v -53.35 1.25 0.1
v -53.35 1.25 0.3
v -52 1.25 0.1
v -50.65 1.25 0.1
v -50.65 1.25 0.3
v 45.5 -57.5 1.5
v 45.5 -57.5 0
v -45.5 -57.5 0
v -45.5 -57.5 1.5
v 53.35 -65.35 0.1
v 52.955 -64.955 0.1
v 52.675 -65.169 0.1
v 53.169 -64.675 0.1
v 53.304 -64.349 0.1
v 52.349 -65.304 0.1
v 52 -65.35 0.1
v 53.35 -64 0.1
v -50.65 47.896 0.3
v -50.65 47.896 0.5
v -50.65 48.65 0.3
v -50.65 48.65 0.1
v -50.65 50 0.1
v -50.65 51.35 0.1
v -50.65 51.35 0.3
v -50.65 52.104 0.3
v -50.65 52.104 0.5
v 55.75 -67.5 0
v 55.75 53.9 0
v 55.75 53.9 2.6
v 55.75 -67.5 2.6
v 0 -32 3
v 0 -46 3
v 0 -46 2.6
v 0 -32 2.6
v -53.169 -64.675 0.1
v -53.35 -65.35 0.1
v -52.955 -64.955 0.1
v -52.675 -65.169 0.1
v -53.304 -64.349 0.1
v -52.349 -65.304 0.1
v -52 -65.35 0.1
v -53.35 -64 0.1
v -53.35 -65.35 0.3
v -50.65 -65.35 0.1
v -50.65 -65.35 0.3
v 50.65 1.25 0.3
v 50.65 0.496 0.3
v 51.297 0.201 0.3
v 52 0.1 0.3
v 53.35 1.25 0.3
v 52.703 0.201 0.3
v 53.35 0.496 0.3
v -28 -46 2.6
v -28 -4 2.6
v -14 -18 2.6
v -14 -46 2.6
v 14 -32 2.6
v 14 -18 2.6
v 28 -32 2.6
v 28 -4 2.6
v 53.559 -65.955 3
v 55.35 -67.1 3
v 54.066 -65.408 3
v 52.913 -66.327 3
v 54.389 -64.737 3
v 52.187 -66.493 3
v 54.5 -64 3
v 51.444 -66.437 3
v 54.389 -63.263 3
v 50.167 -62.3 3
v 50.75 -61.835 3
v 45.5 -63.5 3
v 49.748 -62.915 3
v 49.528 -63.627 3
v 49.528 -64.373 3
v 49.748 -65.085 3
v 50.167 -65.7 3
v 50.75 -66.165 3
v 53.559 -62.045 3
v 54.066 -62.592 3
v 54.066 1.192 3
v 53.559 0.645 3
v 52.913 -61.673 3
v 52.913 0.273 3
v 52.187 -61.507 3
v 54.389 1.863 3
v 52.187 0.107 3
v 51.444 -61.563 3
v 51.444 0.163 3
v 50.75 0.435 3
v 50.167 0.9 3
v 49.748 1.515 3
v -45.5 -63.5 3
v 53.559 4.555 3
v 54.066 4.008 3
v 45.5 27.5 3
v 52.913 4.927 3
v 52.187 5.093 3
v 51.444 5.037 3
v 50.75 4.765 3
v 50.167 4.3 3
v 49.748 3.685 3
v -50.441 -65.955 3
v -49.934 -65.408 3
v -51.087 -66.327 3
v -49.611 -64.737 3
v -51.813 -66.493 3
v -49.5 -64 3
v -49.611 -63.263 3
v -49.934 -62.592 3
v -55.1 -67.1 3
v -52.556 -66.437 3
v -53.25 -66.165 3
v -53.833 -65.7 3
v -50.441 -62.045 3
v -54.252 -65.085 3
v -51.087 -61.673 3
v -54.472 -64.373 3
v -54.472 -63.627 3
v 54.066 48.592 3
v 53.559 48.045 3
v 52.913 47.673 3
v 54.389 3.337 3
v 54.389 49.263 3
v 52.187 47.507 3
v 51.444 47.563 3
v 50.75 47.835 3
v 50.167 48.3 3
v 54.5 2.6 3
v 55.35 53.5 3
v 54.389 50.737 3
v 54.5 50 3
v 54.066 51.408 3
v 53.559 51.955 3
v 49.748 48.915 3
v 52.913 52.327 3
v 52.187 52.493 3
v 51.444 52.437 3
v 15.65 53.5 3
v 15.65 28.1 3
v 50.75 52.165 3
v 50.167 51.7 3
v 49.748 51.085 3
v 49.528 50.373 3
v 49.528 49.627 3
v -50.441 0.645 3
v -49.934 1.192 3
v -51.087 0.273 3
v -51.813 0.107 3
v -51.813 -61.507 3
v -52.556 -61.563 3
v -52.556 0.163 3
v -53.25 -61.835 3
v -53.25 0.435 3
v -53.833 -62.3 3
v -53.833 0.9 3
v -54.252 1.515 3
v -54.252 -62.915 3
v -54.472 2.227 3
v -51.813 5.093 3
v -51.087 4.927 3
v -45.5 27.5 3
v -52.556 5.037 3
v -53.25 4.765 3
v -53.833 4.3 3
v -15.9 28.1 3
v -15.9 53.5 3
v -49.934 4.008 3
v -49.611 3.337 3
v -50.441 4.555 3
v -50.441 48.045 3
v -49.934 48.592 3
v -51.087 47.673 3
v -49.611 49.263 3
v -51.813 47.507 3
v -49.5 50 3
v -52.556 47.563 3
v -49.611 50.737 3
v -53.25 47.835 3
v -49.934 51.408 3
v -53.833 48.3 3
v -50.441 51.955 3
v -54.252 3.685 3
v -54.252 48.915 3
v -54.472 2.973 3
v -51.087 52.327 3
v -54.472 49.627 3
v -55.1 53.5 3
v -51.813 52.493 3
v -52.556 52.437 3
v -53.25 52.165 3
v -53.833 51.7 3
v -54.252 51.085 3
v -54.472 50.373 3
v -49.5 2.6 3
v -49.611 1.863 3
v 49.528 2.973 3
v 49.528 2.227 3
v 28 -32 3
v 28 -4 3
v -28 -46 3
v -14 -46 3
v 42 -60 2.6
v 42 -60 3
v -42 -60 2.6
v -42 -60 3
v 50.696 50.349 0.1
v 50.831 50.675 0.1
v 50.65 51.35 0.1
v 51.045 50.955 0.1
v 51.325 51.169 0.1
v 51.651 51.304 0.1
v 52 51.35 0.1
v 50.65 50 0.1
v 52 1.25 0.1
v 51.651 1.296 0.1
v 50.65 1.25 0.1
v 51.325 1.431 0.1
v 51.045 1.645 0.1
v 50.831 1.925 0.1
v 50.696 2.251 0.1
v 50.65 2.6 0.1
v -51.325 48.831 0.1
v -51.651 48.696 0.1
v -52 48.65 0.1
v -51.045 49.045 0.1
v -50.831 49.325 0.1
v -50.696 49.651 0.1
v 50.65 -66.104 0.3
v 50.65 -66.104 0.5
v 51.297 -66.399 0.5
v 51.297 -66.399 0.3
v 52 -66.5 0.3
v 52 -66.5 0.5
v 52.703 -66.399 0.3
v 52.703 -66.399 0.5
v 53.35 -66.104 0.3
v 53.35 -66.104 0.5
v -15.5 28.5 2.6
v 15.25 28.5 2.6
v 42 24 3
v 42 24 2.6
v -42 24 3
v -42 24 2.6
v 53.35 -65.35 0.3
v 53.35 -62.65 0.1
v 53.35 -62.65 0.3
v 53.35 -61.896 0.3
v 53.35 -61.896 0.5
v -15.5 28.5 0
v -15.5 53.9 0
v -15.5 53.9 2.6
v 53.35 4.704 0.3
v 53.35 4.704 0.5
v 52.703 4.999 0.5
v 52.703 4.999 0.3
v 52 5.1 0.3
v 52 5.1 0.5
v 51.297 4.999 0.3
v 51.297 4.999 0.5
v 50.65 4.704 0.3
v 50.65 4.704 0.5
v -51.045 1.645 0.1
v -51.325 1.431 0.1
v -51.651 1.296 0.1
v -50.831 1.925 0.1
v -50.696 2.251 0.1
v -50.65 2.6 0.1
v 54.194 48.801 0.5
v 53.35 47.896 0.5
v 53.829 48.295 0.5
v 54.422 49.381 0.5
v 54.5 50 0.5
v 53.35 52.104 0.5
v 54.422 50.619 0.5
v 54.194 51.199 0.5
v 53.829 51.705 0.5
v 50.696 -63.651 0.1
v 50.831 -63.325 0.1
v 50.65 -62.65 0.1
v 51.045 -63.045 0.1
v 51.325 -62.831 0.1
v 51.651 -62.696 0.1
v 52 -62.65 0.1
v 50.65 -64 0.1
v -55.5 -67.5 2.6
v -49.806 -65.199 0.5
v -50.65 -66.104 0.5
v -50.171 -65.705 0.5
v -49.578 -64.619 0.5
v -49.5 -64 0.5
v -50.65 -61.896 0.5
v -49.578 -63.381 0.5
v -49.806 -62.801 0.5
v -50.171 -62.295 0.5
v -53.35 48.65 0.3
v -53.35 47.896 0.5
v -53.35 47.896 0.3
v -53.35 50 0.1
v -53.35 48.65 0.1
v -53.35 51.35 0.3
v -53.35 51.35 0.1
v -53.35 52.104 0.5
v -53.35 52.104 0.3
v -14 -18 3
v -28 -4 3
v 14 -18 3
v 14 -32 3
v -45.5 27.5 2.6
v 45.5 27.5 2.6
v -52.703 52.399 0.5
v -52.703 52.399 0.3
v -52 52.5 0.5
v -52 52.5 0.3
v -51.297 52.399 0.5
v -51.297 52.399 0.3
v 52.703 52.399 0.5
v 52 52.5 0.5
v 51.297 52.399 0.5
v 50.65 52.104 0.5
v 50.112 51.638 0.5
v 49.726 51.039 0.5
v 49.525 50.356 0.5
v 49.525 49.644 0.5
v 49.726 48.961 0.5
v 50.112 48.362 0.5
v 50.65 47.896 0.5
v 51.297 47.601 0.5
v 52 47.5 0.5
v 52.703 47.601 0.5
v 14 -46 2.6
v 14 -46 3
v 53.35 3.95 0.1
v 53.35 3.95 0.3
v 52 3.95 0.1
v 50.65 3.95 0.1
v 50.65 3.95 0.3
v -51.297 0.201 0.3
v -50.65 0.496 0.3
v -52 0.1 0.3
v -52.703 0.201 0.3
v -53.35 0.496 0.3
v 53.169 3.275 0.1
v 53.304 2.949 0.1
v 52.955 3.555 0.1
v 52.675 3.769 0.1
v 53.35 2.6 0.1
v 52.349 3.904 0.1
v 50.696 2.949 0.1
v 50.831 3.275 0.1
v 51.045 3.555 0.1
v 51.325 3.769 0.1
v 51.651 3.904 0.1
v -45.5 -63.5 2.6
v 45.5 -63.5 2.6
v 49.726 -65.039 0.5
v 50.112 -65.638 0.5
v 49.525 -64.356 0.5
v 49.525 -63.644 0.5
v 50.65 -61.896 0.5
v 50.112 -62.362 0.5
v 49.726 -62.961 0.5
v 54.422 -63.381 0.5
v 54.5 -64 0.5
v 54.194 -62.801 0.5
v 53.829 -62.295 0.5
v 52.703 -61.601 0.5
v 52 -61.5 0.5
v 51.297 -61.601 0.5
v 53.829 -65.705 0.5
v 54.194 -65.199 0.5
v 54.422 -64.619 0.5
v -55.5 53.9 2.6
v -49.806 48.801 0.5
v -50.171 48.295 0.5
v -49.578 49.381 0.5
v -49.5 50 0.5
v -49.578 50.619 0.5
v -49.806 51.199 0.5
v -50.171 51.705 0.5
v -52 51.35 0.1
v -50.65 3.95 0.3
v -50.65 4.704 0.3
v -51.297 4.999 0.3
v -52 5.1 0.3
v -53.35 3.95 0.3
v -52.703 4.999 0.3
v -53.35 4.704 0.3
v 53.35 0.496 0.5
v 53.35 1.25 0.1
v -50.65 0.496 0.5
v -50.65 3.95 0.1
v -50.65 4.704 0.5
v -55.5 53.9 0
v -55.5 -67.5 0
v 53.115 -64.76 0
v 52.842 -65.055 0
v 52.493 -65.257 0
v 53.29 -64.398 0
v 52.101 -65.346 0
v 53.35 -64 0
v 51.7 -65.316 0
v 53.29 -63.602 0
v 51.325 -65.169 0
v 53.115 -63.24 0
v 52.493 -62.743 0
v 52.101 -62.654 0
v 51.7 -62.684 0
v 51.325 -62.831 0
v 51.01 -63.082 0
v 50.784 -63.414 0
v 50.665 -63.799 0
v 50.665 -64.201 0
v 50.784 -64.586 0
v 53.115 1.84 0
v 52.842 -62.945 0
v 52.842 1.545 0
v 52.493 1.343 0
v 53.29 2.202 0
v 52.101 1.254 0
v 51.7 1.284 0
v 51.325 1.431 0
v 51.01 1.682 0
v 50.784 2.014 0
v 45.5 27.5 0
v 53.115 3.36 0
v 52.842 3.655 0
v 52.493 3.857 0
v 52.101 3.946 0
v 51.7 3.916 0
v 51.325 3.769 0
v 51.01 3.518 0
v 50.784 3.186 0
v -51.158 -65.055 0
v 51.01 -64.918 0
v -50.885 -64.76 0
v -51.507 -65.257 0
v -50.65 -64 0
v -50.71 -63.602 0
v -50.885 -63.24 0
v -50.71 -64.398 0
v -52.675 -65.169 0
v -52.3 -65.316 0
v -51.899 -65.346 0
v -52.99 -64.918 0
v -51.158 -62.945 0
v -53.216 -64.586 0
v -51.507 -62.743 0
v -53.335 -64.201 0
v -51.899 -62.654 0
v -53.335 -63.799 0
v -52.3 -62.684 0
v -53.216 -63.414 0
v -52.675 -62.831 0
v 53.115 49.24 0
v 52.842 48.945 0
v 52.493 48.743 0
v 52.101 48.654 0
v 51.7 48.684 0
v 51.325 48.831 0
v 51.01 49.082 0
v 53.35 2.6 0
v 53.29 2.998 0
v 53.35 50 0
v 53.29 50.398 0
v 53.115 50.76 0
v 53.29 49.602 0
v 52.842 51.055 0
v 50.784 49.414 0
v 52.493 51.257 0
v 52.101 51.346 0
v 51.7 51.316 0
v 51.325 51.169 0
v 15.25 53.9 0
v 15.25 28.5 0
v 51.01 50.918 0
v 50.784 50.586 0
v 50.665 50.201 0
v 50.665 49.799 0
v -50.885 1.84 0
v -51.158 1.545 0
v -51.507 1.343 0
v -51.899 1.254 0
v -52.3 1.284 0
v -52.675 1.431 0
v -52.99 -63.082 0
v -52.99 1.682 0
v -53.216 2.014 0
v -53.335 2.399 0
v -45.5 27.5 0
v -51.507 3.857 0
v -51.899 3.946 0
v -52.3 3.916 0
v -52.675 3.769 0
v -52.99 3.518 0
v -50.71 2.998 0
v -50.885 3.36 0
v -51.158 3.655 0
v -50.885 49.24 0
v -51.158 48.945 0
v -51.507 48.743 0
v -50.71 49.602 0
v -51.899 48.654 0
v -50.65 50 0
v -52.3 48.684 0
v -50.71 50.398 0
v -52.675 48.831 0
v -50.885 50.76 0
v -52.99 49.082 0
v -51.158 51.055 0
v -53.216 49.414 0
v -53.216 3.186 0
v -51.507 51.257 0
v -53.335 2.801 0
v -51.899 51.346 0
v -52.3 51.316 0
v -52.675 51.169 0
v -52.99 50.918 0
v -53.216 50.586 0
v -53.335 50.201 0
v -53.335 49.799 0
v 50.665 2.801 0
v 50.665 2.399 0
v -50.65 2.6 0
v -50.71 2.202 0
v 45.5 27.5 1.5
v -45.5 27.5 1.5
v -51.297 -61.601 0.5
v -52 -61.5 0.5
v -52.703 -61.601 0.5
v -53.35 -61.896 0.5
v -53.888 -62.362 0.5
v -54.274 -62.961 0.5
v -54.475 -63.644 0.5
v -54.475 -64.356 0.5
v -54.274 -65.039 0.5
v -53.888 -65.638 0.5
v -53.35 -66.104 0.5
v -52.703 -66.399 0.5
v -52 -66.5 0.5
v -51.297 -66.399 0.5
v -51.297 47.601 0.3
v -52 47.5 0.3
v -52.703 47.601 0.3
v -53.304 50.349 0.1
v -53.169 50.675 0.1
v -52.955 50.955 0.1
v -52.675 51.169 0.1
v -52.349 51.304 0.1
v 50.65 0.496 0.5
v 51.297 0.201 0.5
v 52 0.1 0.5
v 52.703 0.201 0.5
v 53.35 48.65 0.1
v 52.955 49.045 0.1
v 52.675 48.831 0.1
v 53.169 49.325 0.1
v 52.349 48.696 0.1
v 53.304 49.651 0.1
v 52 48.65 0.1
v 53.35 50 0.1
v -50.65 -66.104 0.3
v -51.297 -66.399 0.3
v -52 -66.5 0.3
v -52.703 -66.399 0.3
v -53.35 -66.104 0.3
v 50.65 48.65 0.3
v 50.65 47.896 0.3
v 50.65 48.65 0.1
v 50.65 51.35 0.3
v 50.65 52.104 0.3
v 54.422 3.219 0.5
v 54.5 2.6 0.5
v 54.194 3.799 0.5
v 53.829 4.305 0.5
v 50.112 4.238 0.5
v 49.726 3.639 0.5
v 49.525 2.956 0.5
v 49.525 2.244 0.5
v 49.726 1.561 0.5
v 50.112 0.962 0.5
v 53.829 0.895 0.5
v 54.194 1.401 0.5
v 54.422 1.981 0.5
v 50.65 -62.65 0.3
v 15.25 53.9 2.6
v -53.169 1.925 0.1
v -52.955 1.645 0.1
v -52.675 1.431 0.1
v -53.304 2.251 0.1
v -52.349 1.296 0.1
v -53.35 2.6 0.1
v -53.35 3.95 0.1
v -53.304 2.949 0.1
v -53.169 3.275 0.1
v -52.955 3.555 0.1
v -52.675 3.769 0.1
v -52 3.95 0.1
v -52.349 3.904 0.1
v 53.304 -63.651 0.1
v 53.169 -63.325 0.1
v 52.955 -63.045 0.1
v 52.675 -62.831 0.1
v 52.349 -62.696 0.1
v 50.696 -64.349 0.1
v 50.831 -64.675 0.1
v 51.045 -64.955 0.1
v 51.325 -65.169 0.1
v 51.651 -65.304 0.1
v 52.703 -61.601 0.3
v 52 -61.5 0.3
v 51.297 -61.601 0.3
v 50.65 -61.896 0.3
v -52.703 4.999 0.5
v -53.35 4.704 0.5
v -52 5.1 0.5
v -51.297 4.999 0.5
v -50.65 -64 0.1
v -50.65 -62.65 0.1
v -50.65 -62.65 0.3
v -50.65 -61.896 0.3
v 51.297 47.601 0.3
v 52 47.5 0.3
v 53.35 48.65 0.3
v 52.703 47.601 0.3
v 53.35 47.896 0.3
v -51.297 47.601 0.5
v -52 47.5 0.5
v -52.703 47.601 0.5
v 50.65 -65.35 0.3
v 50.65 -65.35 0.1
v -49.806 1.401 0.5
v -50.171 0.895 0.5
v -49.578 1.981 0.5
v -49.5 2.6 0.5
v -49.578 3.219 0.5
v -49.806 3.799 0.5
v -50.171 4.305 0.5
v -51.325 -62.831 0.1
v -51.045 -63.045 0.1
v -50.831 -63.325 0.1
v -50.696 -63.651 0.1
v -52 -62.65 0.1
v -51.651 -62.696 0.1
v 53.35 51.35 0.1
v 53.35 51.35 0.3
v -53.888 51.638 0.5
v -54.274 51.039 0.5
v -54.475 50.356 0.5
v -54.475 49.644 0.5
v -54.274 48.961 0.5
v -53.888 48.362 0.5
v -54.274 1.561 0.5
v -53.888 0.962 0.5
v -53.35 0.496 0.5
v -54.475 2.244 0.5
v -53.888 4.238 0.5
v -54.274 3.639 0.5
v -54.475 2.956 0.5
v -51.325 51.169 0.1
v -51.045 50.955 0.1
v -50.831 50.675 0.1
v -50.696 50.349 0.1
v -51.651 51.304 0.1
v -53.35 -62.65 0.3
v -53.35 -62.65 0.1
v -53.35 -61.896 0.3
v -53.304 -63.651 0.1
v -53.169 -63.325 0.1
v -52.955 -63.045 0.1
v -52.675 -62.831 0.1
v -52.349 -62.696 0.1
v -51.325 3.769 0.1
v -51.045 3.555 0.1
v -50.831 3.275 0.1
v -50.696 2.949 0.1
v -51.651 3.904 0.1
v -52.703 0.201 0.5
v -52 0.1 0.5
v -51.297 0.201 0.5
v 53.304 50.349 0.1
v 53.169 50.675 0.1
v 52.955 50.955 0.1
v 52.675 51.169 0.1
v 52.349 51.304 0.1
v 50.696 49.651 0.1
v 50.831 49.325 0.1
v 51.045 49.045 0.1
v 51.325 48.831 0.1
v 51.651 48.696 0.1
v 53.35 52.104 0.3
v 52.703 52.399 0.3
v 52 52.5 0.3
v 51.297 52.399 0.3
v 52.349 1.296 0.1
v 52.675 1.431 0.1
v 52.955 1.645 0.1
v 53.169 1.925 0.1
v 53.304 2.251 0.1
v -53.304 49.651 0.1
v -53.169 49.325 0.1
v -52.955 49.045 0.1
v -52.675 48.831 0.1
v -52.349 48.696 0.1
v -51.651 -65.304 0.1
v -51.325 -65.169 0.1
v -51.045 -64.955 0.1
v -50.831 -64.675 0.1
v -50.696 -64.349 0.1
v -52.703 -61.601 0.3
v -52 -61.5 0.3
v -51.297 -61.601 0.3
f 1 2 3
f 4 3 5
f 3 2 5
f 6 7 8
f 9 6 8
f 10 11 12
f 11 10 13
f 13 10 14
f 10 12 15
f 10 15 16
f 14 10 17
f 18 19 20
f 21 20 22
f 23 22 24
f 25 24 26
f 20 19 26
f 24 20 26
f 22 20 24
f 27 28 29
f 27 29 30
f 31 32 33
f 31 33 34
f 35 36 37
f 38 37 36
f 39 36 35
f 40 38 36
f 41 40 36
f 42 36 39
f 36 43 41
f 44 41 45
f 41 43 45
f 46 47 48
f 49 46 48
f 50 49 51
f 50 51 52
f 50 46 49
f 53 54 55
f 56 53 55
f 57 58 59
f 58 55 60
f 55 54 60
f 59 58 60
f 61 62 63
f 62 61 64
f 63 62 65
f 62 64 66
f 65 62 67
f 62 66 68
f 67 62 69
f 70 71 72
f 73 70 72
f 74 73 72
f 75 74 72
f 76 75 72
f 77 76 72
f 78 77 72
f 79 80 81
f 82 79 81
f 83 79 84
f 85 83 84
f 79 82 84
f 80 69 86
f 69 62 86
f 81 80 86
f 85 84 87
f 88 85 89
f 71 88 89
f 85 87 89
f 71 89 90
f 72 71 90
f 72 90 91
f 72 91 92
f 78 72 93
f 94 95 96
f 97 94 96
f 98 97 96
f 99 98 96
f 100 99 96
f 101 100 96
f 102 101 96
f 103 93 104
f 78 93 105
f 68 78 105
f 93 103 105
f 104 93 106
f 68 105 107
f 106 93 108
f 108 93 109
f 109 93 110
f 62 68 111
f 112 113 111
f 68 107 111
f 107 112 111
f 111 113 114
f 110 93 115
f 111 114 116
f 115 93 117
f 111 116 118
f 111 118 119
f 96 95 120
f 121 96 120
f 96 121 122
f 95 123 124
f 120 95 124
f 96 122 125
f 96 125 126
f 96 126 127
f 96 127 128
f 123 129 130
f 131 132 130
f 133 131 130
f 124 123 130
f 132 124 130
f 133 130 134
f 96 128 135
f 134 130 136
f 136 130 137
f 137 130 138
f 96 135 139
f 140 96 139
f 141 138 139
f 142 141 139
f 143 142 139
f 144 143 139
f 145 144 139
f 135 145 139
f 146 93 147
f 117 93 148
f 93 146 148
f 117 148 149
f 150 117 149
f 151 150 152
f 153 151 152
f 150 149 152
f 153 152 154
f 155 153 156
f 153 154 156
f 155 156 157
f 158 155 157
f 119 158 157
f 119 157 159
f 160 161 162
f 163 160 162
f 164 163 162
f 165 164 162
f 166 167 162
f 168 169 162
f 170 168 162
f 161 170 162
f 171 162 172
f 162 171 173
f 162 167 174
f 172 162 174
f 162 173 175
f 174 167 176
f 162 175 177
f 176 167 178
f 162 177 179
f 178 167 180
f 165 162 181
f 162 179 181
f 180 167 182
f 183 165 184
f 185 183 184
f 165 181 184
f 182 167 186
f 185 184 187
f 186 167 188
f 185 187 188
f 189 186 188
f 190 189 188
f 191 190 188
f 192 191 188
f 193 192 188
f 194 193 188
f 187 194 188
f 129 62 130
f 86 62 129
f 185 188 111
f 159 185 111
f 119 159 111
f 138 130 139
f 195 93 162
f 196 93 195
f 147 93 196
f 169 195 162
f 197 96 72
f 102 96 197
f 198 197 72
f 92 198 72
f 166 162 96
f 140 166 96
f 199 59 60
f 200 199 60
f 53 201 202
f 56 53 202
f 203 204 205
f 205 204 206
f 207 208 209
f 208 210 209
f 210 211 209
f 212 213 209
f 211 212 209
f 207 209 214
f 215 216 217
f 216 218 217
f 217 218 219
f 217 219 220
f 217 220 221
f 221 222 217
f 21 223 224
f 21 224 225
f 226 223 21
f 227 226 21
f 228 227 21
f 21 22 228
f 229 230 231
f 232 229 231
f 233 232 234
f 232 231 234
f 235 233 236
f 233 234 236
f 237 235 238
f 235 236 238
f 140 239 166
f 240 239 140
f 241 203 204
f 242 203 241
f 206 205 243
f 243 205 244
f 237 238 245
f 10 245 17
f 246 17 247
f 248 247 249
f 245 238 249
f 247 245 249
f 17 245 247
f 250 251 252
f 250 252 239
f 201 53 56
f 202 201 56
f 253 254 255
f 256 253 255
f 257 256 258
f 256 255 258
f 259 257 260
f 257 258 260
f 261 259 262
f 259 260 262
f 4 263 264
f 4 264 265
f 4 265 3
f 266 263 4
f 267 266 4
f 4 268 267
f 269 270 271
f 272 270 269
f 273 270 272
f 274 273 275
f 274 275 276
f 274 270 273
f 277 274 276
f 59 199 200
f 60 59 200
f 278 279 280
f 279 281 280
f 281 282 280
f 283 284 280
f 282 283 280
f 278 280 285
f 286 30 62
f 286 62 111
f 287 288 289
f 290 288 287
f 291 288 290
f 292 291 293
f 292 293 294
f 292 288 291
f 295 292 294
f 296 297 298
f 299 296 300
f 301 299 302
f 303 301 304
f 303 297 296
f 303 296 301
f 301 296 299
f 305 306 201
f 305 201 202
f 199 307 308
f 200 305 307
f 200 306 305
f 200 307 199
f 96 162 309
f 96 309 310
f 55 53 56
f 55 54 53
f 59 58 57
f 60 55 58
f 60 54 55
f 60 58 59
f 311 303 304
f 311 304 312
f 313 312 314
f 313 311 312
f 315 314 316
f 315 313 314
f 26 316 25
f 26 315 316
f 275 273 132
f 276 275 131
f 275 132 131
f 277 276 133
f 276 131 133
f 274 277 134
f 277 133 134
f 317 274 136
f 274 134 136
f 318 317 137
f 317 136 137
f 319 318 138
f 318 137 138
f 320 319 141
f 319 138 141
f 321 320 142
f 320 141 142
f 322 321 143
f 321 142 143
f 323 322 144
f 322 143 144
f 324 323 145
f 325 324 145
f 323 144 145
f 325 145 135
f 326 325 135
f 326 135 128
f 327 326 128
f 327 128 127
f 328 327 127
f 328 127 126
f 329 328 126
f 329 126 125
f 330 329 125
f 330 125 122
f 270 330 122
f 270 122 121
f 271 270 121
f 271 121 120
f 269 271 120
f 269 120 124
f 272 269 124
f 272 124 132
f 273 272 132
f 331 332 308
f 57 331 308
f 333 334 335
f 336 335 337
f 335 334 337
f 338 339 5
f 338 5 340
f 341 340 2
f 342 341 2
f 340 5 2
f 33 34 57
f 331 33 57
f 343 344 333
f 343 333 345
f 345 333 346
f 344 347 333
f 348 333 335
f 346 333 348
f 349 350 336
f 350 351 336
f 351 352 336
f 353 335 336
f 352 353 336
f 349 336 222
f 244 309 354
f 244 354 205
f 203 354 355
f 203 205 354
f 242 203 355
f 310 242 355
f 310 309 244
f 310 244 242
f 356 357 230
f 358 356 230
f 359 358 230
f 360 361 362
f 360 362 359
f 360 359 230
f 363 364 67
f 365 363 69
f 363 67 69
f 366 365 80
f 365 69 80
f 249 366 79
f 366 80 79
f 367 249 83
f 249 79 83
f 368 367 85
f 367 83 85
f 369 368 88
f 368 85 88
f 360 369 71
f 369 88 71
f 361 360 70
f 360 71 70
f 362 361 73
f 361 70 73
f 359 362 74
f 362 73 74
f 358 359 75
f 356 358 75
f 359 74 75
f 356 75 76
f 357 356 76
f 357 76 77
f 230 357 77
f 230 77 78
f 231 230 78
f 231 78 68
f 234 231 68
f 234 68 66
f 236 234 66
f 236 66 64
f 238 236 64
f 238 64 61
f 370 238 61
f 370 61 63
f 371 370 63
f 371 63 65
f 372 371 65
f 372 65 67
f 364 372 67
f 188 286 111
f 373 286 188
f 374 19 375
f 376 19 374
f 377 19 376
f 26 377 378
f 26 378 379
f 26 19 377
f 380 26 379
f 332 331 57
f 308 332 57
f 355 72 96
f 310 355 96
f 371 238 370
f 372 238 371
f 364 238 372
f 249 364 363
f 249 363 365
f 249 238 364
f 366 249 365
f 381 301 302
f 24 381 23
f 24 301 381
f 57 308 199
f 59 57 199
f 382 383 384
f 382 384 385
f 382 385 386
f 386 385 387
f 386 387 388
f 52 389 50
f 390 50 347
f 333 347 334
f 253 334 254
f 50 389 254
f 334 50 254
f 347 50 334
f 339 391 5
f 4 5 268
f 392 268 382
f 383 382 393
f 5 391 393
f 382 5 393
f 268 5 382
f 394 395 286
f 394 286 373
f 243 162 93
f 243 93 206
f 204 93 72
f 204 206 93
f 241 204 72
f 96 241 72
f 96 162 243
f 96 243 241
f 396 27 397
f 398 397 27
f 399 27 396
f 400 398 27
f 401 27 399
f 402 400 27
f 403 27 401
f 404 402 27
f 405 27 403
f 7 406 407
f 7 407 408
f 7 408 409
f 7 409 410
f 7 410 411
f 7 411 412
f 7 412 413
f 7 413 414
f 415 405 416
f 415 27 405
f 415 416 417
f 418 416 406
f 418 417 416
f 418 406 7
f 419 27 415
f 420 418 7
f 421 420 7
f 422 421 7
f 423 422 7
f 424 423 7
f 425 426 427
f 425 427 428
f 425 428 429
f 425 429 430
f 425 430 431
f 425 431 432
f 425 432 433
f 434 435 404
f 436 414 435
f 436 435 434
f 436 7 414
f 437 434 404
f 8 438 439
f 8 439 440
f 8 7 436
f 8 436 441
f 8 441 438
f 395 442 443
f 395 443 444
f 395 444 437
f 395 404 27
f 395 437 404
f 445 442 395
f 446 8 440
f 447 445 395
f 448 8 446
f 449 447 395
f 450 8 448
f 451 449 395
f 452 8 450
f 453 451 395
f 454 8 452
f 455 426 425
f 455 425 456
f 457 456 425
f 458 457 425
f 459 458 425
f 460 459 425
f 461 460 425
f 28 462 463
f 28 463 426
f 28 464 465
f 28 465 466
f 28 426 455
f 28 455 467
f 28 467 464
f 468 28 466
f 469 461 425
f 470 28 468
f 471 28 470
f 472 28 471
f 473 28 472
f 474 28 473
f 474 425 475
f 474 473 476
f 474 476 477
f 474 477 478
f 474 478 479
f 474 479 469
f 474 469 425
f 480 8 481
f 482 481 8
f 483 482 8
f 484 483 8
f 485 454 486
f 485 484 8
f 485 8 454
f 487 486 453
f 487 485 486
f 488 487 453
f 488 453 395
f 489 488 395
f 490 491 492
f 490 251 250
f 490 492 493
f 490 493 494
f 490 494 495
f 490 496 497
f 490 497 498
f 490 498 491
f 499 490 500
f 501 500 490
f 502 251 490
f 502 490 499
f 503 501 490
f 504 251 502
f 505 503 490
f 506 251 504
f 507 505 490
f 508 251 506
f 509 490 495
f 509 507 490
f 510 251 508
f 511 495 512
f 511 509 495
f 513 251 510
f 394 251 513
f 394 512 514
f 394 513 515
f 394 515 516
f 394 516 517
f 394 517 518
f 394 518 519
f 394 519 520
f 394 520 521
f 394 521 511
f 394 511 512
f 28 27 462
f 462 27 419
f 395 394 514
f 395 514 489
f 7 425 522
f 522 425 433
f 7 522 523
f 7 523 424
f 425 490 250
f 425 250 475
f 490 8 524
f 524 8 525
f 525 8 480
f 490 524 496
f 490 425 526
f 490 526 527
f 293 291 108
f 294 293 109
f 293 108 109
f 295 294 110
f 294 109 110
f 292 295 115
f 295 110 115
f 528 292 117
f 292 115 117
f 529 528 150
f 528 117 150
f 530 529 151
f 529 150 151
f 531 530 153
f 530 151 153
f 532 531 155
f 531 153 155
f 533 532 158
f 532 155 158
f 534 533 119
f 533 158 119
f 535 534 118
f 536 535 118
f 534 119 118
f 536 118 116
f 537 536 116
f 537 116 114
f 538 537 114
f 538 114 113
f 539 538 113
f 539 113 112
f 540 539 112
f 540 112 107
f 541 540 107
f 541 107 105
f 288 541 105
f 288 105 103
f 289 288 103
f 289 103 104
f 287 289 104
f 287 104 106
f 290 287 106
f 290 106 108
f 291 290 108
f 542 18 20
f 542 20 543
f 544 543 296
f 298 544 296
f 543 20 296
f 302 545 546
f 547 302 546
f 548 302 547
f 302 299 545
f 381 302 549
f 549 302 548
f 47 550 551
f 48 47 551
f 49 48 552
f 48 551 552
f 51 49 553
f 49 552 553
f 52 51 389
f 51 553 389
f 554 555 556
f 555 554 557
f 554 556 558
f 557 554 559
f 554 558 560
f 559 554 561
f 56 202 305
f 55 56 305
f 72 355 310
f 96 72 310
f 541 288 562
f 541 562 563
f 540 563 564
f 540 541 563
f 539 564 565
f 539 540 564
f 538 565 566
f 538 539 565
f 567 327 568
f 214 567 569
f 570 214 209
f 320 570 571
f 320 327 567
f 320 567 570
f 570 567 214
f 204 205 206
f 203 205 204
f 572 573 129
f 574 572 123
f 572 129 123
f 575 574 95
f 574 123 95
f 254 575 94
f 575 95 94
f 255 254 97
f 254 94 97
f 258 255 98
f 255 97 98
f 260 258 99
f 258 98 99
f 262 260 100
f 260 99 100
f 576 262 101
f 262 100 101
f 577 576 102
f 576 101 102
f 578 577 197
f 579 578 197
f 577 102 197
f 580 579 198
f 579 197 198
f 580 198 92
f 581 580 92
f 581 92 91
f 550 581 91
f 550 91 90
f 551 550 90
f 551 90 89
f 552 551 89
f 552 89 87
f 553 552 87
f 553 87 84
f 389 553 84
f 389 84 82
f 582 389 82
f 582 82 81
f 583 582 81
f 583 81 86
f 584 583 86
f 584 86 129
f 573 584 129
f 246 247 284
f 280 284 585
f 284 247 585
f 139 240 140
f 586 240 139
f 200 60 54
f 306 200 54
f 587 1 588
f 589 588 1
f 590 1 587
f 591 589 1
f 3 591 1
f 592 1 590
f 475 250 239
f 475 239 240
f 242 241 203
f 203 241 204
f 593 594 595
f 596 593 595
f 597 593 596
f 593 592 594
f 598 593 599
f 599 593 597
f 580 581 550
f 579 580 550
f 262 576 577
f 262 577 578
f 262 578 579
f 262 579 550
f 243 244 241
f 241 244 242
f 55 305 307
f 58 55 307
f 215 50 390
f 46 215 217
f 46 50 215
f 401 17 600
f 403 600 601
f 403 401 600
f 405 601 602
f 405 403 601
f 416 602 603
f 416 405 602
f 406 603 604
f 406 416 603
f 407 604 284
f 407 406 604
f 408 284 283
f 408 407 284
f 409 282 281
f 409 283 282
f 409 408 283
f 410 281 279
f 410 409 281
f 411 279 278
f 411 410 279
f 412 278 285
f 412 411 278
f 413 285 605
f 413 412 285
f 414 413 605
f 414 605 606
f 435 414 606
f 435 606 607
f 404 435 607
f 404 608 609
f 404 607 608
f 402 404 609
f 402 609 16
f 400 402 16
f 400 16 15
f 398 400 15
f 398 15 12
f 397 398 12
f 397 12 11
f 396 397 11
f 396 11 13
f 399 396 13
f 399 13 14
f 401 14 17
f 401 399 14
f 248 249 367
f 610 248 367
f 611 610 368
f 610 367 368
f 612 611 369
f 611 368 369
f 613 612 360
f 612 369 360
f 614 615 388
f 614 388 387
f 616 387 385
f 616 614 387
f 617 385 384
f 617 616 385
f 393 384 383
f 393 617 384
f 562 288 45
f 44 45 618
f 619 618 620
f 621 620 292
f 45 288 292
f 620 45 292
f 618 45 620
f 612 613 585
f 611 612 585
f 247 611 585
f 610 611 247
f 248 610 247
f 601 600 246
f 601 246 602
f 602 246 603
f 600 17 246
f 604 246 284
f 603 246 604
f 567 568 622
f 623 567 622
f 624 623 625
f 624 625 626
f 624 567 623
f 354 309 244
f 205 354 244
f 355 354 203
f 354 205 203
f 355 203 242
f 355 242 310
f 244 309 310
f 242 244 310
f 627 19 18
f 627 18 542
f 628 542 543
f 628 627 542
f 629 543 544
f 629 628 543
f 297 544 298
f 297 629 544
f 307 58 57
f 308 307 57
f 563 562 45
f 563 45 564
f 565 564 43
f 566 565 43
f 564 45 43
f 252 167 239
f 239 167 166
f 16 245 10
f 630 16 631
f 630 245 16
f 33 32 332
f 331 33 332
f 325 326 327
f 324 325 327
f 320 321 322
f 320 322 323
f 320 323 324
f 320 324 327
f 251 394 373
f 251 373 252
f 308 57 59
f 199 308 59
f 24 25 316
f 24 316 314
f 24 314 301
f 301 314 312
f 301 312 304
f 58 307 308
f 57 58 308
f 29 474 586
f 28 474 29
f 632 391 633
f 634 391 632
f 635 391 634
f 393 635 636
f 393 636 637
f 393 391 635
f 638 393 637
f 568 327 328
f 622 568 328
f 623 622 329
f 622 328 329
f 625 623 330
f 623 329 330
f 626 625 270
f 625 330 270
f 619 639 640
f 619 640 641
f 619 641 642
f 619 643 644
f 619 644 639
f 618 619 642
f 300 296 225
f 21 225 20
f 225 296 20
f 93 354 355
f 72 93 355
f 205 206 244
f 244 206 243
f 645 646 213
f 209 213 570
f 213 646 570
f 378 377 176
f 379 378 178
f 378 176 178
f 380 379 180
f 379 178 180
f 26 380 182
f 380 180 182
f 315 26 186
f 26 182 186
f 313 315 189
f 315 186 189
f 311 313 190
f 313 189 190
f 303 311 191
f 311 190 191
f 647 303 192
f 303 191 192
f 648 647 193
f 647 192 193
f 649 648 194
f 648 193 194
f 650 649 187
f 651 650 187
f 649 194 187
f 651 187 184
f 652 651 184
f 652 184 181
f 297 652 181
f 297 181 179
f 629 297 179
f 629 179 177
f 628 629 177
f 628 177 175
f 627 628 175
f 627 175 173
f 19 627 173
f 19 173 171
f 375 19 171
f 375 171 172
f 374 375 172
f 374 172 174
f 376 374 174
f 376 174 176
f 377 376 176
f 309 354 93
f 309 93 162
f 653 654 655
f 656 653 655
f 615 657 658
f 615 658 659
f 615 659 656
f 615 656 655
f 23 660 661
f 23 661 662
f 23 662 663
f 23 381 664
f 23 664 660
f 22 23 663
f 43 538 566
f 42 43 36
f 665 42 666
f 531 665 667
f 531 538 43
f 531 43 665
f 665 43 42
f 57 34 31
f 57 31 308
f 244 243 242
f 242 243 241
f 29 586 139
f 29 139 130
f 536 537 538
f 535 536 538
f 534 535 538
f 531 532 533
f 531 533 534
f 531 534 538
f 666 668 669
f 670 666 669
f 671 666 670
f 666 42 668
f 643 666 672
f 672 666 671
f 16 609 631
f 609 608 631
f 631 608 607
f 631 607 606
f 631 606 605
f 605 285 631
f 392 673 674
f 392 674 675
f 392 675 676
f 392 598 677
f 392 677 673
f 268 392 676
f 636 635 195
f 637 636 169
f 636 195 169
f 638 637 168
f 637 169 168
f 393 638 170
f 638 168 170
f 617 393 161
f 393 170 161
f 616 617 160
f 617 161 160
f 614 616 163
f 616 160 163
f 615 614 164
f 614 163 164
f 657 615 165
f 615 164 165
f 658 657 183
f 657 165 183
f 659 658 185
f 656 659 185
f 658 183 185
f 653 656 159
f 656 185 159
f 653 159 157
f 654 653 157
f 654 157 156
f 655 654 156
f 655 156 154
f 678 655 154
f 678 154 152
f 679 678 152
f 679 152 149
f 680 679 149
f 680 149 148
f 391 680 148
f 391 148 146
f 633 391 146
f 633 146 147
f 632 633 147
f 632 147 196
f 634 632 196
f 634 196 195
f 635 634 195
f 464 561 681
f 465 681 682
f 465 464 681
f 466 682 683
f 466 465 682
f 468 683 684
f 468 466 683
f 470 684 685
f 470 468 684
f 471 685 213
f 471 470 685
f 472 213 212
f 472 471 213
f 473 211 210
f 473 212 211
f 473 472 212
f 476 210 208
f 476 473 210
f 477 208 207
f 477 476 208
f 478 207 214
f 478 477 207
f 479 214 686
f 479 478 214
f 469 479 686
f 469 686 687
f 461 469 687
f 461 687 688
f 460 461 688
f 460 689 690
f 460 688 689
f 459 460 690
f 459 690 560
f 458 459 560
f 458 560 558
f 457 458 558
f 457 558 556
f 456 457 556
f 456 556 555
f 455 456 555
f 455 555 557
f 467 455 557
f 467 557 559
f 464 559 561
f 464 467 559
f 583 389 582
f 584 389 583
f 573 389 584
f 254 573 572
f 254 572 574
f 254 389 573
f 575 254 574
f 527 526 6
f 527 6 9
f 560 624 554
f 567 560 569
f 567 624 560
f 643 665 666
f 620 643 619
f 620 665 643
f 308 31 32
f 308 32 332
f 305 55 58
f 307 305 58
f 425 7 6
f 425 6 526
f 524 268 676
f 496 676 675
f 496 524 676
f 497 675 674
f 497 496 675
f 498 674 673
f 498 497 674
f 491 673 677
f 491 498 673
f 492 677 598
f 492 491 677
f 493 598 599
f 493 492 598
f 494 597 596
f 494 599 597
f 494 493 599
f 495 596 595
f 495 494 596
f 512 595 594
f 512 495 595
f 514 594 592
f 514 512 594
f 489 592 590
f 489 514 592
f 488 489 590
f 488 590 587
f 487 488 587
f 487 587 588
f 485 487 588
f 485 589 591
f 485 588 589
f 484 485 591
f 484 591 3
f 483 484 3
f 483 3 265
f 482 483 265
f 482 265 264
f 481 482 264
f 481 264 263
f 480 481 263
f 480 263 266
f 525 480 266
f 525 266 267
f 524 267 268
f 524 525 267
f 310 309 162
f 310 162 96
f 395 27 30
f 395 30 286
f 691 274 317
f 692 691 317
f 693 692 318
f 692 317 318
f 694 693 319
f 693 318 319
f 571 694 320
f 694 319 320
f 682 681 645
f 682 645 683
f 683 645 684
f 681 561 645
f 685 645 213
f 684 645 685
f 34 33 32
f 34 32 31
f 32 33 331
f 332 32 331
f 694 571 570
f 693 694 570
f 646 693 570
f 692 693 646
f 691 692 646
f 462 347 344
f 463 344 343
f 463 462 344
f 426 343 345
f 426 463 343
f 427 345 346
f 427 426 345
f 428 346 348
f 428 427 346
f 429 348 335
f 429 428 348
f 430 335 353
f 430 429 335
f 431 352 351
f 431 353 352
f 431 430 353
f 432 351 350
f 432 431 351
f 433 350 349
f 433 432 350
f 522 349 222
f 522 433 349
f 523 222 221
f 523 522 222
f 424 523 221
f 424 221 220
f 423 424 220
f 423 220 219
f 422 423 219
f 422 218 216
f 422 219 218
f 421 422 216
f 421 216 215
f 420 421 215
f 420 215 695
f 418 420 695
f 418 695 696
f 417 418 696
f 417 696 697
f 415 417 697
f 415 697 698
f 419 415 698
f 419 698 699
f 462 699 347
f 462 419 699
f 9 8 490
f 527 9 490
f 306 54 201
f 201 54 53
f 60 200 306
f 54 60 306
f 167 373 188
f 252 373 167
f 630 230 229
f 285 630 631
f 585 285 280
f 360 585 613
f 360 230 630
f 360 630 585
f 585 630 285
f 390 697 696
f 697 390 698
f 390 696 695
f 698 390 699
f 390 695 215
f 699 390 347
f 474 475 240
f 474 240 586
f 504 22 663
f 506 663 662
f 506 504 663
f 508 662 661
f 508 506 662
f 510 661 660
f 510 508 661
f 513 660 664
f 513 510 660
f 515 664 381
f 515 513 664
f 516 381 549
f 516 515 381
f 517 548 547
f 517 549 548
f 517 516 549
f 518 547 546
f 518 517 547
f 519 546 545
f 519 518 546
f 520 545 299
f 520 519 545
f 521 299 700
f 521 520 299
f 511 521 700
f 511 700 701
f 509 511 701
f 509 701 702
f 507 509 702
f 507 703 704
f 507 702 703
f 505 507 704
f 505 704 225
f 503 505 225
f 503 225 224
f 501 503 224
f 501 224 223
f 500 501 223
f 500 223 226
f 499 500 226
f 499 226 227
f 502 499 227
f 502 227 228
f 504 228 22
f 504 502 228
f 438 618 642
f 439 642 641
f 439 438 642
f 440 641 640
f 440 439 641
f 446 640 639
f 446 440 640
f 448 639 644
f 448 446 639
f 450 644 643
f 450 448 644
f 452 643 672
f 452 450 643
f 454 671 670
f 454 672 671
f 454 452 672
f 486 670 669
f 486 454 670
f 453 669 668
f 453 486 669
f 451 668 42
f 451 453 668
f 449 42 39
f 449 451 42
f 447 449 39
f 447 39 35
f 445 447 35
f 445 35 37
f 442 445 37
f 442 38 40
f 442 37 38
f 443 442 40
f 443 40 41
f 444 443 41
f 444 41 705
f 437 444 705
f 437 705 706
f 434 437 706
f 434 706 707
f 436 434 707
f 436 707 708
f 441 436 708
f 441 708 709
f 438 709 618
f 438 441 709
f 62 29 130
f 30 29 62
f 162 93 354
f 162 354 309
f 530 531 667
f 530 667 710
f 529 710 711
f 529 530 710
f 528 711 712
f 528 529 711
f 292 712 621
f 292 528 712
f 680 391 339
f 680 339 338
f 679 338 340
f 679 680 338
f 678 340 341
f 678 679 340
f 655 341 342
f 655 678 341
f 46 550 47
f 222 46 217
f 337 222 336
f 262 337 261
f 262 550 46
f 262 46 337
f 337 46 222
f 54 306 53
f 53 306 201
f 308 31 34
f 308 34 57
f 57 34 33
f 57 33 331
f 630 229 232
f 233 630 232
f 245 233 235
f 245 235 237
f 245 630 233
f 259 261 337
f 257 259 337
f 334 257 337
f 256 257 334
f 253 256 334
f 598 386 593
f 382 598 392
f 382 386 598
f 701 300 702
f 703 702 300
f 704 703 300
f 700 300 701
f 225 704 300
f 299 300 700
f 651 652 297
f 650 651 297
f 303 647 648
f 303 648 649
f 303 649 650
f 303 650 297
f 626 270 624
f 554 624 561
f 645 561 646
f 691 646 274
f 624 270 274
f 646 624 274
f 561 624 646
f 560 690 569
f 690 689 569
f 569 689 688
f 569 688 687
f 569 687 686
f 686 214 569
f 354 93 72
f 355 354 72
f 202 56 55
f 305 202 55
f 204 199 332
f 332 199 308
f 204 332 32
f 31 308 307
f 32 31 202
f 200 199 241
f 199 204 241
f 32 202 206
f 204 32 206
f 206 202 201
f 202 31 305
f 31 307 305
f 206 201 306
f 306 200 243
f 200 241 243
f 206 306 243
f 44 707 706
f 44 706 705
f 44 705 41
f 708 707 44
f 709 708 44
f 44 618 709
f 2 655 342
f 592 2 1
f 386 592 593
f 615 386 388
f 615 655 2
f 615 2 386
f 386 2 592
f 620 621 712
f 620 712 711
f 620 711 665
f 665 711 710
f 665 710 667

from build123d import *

# Parameters (mm, degrees)
SKETCH1_R             = 1.35
BOSS_EXTRUDE1_DEPTH   = 3
SKETCH3_R             = 2.5
CUT_EXTRUDE1_DEPTH    = 2.5
SKETCH4_W             = 91
SKETCH4_H             = 85
CUT_EXTRUDE2_DEPTH    = 1.5
CUT_EXTRUDE3_DEPTH    = 0.2
SKETCH6_W             = 2.7
SKETCH6_H             = 2.7
CUT_EXTRUDE4_DEPTH    = 0.2
CHAMFER1_SIZE         = 0.4
SKETCH7_W             = 91
SKETCH7_H             = 91
CUT_EXTRUDE5_DEPTH    = 0.4
SKETCH8_W             = 91
SKETCH8_H             = 91
SKETCH8_W_2           = 84
SKETCH8_H_2           = 84
BOSS_EXTRUDE2_DEPTH   = 0.4
SKETCH9_W             = 14
SKETCH9_H             = 14
CUT_EXTRUDE6_DEPTH    = 0.4
SKETCH10_W            = 14
SKETCH10_H            = 14
BOSS_EXTRUDE3_DEPTH   = 0.4
BOSS_EXTRUDE3_2_DEPTH = 0.4


with BuildPart() as part:
    # Sketch1 → Boss-Extrude1 (new body)
    with BuildSketch(Plane.XY):
        Polygon((-15.5, 53.9), (-15.5, 28.5), (15.25, 28.5), (15.25, 53.9), (55.75, 53.9), (55.75, -67.5), (-55.5, -67.5), (-55.5, 53.9), align=None)
        with Locations((-52, 50)):
            Circle(SKETCH1_R, mode=Mode.SUBTRACT)
        with Locations((-52, 2.6)):
            Circle(SKETCH1_R, mode=Mode.SUBTRACT)
        with Locations((-52, -64)):
            Circle(SKETCH1_R, mode=Mode.SUBTRACT)
        with Locations((52, 50)):
            Circle(SKETCH1_R, mode=Mode.SUBTRACT)
        with Locations((52, 2.6)):
            Circle(SKETCH1_R, mode=Mode.SUBTRACT)
        with Locations((52, -64)):
            Circle(SKETCH1_R, mode=Mode.SUBTRACT)
    extrude(amount=BOSS_EXTRUDE1_DEPTH)

    # Sketch3 → Cut-Extrude1 (cut)
    with BuildSketch(Plane.XY.offset(3)):
        with Locations((-52, 50)):
            Circle(SKETCH3_R)
        with Locations((-52, 2.6)):
            Circle(SKETCH3_R)
        with Locations((-52, -64)):
            Circle(SKETCH3_R)
        with Locations((52, -64)):
            Circle(SKETCH3_R)
        with Locations((52, 2.6)):
            Circle(SKETCH3_R)
        with Locations((52, 50)):
            Circle(SKETCH3_R)
    extrude(amount=-CUT_EXTRUDE1_DEPTH, mode=Mode.SUBTRACT)

    # Sketch4 → Cut-Extrude2 (cut)
    with BuildSketch(Plane(origin=(0, 0, 0), x_dir=(-1, 0, 0), z_dir=(0, 0, -1))):
        with Locations((0, -15)):
            Rectangle(SKETCH4_W, SKETCH4_H)
    extrude(amount=-CUT_EXTRUDE2_DEPTH, mode=Mode.SUBTRACT)

    # Sketch5 → Cut-Extrude3 (cut)
    with BuildSketch(Plane.XY.offset(0.5)):
        with BuildLine():
            Line((-53.35, 47.895837459), (-53.35, 52.104162541))
            ThreePointArc((-53.35, 52.104162541), (-52, 52.5), (-50.65, 52.104162541))
            Line((-50.65, 52.104162541), (-50.65, 47.895837459))
            ThreePointArc((-50.65, 47.895837459), (-52, 47.5), (-53.35, 47.895837459))
        make_face()
        with BuildLine():
            Line((-53.35, 0.495837459), (-53.35, 4.704162541))
            ThreePointArc((-53.35, 4.704162541), (-52, 5.1), (-50.65, 4.704162541))
            Line((-50.65, 4.704162541), (-50.65, 0.495837459))
            ThreePointArc((-50.65, 0.495837459), (-52, 0.1), (-53.35, 0.495837459))
        make_face()
        with BuildLine():
            Line((-53.35, -66.104162541), (-53.35, -61.895837459))
            ThreePointArc((-53.35, -61.895837459), (-52, -61.5), (-50.65, -61.895837459))
            Line((-50.65, -61.895837459), (-50.65, -66.104162541))
            ThreePointArc((-50.65, -66.104162541), (-52, -66.5), (-53.35, -66.104162541))
        make_face()
    cut_extrude3 = extrude(amount=-CUT_EXTRUDE3_DEPTH, mode=Mode.SUBTRACT)

    # Sketch6 → Cut-Extrude4 (cut)
    with BuildSketch(Plane.XY.offset(0.3)):
        with Locations((-52, -64)):
            Rectangle(SKETCH6_W, SKETCH6_H)
        with Locations((-52, 2.6)):
            Rectangle(SKETCH6_W, SKETCH6_H)
        with Locations((-52, 50)):
            Rectangle(SKETCH6_W, SKETCH6_H)
    cut_extrude4 = extrude(amount=-CUT_EXTRUDE4_DEPTH, mode=Mode.SUBTRACT)

    # Mirror1: Cut-Extrude3, Cut-Extrude4 across plane
    add(cut_extrude3.mirror(Plane(origin=(0, 0, 0), x_dir=(0, 0, 1), z_dir=(1, 0, 0))), mode=Mode.SUBTRACT)
    add(cut_extrude4.mirror(Plane(origin=(0, 0, 0), x_dir=(0, 0, 1), z_dir=(1, 0, 0))), mode=Mode.SUBTRACT)

    # Chamfer1
    chamfer1_edges = [part.edges().sort_by_distance(p)[0] for p in [
        (55.75, -6.8, 3),
        (35.5, 53.9, 3),
        (15.25, 41.2, 3),
        (-0.125, 28.5, 3),
        (-15.5, 41.2, 3),
        (-35.5, 53.9, 3),
        (-55.5, -6.8, 3),
        (0.125, -67.5, 3),
    ]]
    chamfer(chamfer1_edges, length=CHAMFER1_SIZE)

    # Sketch7 → Cut-Extrude5 (cut)
    with BuildSketch(Plane.XY.offset(3)):
        with Locations((0, -18)):
            Rectangle(SKETCH7_W, SKETCH7_H)
        Polygon((28, 24), (42, 24), (42, 10), (42, -4), (42, -18), (42, -32), (42, -46), (42, -60), (28, -60), (14, -60), (0, -60), (-14, -60), (-28, -60), (-42, -60), (-42, -46), (-42, -32), (-42, -18), (-42, -4), (-42, 10), (-42, 24), (-28, 24), (-14, 24), (0, 24), (14, 24), align=None, mode=Mode.SUBTRACT)
    extrude(amount=-CUT_EXTRUDE5_DEPTH, mode=Mode.SUBTRACT)

    # Sketch9 → Cut-Extrude6 (cut)
    with BuildSketch(Plane.XY.offset(3)):
        with Locations((7, -39)):
            Rectangle(SKETCH9_W, SKETCH9_H)
        Polygon((-28, -18), (-28, -32), (-28, -46), (-14, -46), (-14, -32), (-14, -18), (0, -18), (14, -18), (14, -32), (28, -32), (28, -18), (28, -4), (14, -4), (0, -4), (-14, -4), (-28, -4), align=None)
    extrude(amount=-CUT_EXTRUDE6_DEPTH, mode=Mode.SUBTRACT)


with BuildPart() as body_2:
    # Sketch8 → Boss-Extrude2 (new body)
    with BuildSketch(Plane.XY.offset(2.6)):
        with Locations((0, -18)):
            Rectangle(SKETCH8_W, SKETCH8_H)
        with Locations((0, -18)):
            Rectangle(SKETCH8_W_2, SKETCH8_H_2, mode=Mode.SUBTRACT)
    extrude(amount=BOSS_EXTRUDE2_DEPTH)


with BuildPart() as body_3:
    # Sketch10 → Boss-Extrude3 (new body)
    with BuildSketch(Plane.XY.offset(2.6)):
        with Locations((7, -39)):
            Rectangle(SKETCH10_W, SKETCH10_H)
    extrude(amount=BOSS_EXTRUDE3_DEPTH)


with BuildPart() as body_4:
    # Sketch10 → Boss-Extrude3 2 (new body)
    with BuildSketch(Plane.XY.offset(2.6)):
        Polygon((14, -18), (14, -32), (28, -32), (28, -4), (-28, -4), (-28, -46), (-14, -46), (-14, -18), align=None)
    extrude(amount=BOSS_EXTRUDE3_2_DEPTH)


solid = Compound([part.part, body_2.part, body_3.part, body_4.part])
